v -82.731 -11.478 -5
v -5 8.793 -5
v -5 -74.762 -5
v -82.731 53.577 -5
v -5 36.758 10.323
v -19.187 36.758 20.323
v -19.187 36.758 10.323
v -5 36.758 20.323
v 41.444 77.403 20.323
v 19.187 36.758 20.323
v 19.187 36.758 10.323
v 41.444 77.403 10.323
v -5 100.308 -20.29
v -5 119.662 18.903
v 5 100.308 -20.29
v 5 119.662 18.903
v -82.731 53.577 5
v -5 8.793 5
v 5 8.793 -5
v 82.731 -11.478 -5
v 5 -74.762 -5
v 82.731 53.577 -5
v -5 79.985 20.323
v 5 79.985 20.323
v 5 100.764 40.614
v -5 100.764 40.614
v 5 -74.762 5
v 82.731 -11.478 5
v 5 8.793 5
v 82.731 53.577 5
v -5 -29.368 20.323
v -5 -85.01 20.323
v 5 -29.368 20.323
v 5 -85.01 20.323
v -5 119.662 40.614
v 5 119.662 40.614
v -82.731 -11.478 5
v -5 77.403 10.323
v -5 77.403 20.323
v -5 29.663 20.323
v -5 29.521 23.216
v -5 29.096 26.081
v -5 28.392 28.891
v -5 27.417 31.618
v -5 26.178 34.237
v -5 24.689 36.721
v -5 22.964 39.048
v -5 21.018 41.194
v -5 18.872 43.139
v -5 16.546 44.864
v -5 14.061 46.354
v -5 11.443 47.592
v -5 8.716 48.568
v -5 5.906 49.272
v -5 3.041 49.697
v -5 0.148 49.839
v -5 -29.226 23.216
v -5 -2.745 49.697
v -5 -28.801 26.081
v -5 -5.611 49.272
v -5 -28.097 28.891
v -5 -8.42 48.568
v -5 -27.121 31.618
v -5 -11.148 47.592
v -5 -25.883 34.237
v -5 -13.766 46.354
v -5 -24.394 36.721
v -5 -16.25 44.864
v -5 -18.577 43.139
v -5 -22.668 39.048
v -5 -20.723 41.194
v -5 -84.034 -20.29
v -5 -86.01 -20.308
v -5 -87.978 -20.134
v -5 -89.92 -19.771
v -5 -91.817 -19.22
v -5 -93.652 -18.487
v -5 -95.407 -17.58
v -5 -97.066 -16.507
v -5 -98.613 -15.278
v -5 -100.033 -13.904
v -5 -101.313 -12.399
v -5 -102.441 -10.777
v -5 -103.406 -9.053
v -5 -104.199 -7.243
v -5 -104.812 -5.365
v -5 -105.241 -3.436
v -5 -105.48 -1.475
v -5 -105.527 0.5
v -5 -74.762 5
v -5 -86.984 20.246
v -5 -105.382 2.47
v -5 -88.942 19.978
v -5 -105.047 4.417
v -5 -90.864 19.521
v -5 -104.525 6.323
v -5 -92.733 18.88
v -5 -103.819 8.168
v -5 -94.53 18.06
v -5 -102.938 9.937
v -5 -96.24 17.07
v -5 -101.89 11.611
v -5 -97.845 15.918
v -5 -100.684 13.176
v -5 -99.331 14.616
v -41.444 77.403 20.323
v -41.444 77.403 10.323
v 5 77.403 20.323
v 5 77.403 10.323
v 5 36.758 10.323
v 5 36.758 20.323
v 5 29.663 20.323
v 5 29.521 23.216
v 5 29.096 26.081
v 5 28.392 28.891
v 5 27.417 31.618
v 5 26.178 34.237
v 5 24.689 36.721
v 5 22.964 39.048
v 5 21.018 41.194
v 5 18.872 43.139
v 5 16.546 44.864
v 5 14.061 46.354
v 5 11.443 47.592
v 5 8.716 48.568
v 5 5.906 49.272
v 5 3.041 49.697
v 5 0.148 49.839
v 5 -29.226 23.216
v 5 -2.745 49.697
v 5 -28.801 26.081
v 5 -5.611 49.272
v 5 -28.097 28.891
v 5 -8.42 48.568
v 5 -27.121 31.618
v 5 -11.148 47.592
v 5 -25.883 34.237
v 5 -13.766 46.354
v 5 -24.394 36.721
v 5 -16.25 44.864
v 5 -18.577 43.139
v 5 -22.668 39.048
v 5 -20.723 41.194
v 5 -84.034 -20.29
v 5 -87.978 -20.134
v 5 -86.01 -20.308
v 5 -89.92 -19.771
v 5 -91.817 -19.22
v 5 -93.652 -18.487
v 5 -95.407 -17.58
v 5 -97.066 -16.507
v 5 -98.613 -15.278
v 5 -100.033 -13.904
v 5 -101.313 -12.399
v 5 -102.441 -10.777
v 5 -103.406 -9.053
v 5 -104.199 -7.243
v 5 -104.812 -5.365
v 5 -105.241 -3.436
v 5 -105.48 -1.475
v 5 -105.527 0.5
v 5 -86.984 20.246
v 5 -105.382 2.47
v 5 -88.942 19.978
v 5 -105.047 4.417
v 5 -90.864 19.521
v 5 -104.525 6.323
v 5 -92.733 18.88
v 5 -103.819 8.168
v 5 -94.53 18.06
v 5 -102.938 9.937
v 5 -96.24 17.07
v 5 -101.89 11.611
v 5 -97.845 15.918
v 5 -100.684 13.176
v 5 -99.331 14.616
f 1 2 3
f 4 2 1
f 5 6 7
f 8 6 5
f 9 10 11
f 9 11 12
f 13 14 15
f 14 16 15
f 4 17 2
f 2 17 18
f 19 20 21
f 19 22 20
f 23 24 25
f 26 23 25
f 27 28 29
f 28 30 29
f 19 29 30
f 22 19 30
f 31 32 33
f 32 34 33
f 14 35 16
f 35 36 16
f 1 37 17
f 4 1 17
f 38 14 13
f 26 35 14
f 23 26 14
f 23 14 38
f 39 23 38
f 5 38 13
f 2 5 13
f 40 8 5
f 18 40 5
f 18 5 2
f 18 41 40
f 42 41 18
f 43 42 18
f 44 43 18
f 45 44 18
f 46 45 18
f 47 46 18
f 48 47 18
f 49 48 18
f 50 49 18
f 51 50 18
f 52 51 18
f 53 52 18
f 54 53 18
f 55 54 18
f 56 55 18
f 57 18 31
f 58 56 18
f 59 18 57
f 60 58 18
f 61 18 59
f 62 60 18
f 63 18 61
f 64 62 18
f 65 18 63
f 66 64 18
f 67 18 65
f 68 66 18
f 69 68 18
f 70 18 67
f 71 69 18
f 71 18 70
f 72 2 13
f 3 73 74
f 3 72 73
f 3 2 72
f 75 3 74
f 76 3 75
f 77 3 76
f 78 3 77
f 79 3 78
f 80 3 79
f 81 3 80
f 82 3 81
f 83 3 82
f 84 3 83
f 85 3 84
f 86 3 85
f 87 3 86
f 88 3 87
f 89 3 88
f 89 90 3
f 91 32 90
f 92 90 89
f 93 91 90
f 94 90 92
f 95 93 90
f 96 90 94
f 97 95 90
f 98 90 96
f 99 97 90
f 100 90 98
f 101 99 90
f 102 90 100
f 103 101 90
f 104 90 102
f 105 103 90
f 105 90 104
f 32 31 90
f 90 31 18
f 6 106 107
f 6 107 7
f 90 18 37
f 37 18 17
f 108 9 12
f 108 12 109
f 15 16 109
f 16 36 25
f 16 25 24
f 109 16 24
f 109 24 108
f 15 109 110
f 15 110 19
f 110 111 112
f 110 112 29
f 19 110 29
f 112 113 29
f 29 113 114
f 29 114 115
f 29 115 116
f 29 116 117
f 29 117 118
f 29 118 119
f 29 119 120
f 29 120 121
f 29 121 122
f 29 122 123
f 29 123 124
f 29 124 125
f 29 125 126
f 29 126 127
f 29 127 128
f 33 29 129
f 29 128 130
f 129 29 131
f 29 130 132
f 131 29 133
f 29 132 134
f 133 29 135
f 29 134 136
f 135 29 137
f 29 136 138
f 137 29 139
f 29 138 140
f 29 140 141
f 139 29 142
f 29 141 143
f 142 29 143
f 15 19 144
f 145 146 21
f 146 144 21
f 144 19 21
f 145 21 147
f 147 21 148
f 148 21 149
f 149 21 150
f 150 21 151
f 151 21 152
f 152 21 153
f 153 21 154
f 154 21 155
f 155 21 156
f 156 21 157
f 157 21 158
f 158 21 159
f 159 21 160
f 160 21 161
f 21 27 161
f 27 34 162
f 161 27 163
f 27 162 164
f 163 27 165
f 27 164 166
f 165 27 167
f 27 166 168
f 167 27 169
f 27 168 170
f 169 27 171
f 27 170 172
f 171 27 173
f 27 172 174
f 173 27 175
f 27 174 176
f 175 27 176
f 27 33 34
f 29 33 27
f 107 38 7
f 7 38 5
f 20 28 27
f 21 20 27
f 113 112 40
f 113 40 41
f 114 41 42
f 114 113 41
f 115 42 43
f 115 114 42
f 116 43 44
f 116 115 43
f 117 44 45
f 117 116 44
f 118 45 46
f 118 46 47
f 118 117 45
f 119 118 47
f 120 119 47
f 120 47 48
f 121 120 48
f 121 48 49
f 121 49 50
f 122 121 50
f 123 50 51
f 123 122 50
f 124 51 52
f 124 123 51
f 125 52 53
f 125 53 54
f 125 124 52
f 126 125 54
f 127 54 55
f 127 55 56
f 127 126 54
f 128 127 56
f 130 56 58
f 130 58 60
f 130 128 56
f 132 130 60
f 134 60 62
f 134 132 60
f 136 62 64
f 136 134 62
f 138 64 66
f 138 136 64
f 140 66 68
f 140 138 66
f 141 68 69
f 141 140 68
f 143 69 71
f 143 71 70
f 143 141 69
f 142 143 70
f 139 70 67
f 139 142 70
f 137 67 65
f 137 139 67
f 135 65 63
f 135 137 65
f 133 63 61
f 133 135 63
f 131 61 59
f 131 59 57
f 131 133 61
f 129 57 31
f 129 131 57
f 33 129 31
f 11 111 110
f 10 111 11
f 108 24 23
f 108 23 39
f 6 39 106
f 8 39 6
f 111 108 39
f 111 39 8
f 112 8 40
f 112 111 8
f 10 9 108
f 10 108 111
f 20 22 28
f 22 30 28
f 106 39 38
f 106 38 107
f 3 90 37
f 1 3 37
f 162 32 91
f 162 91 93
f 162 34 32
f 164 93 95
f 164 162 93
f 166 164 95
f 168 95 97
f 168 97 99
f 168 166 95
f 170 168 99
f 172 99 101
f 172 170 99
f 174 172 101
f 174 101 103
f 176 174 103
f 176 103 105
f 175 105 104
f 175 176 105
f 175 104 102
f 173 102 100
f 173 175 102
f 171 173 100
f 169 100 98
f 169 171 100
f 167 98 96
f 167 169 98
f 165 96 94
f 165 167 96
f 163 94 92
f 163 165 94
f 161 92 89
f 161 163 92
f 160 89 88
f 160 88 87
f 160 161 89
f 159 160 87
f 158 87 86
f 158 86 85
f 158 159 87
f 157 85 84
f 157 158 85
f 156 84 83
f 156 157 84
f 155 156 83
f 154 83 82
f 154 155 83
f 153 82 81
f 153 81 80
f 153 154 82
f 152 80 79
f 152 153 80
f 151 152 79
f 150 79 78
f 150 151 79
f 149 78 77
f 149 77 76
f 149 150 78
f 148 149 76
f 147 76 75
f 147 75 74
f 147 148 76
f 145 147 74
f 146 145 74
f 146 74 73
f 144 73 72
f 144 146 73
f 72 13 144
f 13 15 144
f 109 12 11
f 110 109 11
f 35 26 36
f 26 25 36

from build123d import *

# Parameters (mm, degrees)
PAD_DEPTH    = 5
PAD001_DEPTH = 5
PAD002_DEPTH = 10


with BuildPart() as part:
    # Sketch → Pad (new body, symmetric)
    with BuildSketch(Plane.YZ):
        with BuildLine():
            Line((79.985253, 20.323011), (100.763572, 40.6142))
            Line((100.763572, 40.6142), (119.662178, 40.6142))
            Line((119.662178, 40.6142), (119.662178, 18.903042))
            Line((119.662178, 18.903042), (100.307594, -20.290001))
            Line((100.307594, -20.290001), (-84.034331, -20.290001))
            ThreePointArc((-85.010115, 20.323011), (-105.527296, -0.488171), (-84.034331, -20.290001))
            Line((-85.010115, 20.323011), (-29.368151, 20.323011))
            ThreePointArc((29.663353, 20.323011), (0.147601, 49.838763), (-29.368151, 20.323011))
            Line((29.663353, 20.323011), (79.985253, 20.323011))
        make_face()
    extrude(amount=PAD_DEPTH, both=True)

    # Sketch001 → Pad001 (join, symmetric)
    with BuildSketch(Plane.XY):
        Polygon((-82.730919, -11.478452), (-82.730919, 53.577414), (0, 5.912332), (82.730919, 53.577414), (82.730919, -11.478452), (0, -78.832466), align=None)
    extrude(amount=PAD001_DEPTH, both=True)

    # Sketch002 (on Face1 of Pad001) → Pad002 (join)
    with BuildSketch(Plane(origin=(0, 0, 20.323011), x_dir=(0, -1, 0), z_dir=(0, 0, 1))):
        Polygon((-77.402542, 41.444447), (-77.402542, -41.444447), (-36.757927, -19.18667), (-36.757927, 19.18667), align=None)
    extrude(amount=-PAD002_DEPTH)


solid = part.part
